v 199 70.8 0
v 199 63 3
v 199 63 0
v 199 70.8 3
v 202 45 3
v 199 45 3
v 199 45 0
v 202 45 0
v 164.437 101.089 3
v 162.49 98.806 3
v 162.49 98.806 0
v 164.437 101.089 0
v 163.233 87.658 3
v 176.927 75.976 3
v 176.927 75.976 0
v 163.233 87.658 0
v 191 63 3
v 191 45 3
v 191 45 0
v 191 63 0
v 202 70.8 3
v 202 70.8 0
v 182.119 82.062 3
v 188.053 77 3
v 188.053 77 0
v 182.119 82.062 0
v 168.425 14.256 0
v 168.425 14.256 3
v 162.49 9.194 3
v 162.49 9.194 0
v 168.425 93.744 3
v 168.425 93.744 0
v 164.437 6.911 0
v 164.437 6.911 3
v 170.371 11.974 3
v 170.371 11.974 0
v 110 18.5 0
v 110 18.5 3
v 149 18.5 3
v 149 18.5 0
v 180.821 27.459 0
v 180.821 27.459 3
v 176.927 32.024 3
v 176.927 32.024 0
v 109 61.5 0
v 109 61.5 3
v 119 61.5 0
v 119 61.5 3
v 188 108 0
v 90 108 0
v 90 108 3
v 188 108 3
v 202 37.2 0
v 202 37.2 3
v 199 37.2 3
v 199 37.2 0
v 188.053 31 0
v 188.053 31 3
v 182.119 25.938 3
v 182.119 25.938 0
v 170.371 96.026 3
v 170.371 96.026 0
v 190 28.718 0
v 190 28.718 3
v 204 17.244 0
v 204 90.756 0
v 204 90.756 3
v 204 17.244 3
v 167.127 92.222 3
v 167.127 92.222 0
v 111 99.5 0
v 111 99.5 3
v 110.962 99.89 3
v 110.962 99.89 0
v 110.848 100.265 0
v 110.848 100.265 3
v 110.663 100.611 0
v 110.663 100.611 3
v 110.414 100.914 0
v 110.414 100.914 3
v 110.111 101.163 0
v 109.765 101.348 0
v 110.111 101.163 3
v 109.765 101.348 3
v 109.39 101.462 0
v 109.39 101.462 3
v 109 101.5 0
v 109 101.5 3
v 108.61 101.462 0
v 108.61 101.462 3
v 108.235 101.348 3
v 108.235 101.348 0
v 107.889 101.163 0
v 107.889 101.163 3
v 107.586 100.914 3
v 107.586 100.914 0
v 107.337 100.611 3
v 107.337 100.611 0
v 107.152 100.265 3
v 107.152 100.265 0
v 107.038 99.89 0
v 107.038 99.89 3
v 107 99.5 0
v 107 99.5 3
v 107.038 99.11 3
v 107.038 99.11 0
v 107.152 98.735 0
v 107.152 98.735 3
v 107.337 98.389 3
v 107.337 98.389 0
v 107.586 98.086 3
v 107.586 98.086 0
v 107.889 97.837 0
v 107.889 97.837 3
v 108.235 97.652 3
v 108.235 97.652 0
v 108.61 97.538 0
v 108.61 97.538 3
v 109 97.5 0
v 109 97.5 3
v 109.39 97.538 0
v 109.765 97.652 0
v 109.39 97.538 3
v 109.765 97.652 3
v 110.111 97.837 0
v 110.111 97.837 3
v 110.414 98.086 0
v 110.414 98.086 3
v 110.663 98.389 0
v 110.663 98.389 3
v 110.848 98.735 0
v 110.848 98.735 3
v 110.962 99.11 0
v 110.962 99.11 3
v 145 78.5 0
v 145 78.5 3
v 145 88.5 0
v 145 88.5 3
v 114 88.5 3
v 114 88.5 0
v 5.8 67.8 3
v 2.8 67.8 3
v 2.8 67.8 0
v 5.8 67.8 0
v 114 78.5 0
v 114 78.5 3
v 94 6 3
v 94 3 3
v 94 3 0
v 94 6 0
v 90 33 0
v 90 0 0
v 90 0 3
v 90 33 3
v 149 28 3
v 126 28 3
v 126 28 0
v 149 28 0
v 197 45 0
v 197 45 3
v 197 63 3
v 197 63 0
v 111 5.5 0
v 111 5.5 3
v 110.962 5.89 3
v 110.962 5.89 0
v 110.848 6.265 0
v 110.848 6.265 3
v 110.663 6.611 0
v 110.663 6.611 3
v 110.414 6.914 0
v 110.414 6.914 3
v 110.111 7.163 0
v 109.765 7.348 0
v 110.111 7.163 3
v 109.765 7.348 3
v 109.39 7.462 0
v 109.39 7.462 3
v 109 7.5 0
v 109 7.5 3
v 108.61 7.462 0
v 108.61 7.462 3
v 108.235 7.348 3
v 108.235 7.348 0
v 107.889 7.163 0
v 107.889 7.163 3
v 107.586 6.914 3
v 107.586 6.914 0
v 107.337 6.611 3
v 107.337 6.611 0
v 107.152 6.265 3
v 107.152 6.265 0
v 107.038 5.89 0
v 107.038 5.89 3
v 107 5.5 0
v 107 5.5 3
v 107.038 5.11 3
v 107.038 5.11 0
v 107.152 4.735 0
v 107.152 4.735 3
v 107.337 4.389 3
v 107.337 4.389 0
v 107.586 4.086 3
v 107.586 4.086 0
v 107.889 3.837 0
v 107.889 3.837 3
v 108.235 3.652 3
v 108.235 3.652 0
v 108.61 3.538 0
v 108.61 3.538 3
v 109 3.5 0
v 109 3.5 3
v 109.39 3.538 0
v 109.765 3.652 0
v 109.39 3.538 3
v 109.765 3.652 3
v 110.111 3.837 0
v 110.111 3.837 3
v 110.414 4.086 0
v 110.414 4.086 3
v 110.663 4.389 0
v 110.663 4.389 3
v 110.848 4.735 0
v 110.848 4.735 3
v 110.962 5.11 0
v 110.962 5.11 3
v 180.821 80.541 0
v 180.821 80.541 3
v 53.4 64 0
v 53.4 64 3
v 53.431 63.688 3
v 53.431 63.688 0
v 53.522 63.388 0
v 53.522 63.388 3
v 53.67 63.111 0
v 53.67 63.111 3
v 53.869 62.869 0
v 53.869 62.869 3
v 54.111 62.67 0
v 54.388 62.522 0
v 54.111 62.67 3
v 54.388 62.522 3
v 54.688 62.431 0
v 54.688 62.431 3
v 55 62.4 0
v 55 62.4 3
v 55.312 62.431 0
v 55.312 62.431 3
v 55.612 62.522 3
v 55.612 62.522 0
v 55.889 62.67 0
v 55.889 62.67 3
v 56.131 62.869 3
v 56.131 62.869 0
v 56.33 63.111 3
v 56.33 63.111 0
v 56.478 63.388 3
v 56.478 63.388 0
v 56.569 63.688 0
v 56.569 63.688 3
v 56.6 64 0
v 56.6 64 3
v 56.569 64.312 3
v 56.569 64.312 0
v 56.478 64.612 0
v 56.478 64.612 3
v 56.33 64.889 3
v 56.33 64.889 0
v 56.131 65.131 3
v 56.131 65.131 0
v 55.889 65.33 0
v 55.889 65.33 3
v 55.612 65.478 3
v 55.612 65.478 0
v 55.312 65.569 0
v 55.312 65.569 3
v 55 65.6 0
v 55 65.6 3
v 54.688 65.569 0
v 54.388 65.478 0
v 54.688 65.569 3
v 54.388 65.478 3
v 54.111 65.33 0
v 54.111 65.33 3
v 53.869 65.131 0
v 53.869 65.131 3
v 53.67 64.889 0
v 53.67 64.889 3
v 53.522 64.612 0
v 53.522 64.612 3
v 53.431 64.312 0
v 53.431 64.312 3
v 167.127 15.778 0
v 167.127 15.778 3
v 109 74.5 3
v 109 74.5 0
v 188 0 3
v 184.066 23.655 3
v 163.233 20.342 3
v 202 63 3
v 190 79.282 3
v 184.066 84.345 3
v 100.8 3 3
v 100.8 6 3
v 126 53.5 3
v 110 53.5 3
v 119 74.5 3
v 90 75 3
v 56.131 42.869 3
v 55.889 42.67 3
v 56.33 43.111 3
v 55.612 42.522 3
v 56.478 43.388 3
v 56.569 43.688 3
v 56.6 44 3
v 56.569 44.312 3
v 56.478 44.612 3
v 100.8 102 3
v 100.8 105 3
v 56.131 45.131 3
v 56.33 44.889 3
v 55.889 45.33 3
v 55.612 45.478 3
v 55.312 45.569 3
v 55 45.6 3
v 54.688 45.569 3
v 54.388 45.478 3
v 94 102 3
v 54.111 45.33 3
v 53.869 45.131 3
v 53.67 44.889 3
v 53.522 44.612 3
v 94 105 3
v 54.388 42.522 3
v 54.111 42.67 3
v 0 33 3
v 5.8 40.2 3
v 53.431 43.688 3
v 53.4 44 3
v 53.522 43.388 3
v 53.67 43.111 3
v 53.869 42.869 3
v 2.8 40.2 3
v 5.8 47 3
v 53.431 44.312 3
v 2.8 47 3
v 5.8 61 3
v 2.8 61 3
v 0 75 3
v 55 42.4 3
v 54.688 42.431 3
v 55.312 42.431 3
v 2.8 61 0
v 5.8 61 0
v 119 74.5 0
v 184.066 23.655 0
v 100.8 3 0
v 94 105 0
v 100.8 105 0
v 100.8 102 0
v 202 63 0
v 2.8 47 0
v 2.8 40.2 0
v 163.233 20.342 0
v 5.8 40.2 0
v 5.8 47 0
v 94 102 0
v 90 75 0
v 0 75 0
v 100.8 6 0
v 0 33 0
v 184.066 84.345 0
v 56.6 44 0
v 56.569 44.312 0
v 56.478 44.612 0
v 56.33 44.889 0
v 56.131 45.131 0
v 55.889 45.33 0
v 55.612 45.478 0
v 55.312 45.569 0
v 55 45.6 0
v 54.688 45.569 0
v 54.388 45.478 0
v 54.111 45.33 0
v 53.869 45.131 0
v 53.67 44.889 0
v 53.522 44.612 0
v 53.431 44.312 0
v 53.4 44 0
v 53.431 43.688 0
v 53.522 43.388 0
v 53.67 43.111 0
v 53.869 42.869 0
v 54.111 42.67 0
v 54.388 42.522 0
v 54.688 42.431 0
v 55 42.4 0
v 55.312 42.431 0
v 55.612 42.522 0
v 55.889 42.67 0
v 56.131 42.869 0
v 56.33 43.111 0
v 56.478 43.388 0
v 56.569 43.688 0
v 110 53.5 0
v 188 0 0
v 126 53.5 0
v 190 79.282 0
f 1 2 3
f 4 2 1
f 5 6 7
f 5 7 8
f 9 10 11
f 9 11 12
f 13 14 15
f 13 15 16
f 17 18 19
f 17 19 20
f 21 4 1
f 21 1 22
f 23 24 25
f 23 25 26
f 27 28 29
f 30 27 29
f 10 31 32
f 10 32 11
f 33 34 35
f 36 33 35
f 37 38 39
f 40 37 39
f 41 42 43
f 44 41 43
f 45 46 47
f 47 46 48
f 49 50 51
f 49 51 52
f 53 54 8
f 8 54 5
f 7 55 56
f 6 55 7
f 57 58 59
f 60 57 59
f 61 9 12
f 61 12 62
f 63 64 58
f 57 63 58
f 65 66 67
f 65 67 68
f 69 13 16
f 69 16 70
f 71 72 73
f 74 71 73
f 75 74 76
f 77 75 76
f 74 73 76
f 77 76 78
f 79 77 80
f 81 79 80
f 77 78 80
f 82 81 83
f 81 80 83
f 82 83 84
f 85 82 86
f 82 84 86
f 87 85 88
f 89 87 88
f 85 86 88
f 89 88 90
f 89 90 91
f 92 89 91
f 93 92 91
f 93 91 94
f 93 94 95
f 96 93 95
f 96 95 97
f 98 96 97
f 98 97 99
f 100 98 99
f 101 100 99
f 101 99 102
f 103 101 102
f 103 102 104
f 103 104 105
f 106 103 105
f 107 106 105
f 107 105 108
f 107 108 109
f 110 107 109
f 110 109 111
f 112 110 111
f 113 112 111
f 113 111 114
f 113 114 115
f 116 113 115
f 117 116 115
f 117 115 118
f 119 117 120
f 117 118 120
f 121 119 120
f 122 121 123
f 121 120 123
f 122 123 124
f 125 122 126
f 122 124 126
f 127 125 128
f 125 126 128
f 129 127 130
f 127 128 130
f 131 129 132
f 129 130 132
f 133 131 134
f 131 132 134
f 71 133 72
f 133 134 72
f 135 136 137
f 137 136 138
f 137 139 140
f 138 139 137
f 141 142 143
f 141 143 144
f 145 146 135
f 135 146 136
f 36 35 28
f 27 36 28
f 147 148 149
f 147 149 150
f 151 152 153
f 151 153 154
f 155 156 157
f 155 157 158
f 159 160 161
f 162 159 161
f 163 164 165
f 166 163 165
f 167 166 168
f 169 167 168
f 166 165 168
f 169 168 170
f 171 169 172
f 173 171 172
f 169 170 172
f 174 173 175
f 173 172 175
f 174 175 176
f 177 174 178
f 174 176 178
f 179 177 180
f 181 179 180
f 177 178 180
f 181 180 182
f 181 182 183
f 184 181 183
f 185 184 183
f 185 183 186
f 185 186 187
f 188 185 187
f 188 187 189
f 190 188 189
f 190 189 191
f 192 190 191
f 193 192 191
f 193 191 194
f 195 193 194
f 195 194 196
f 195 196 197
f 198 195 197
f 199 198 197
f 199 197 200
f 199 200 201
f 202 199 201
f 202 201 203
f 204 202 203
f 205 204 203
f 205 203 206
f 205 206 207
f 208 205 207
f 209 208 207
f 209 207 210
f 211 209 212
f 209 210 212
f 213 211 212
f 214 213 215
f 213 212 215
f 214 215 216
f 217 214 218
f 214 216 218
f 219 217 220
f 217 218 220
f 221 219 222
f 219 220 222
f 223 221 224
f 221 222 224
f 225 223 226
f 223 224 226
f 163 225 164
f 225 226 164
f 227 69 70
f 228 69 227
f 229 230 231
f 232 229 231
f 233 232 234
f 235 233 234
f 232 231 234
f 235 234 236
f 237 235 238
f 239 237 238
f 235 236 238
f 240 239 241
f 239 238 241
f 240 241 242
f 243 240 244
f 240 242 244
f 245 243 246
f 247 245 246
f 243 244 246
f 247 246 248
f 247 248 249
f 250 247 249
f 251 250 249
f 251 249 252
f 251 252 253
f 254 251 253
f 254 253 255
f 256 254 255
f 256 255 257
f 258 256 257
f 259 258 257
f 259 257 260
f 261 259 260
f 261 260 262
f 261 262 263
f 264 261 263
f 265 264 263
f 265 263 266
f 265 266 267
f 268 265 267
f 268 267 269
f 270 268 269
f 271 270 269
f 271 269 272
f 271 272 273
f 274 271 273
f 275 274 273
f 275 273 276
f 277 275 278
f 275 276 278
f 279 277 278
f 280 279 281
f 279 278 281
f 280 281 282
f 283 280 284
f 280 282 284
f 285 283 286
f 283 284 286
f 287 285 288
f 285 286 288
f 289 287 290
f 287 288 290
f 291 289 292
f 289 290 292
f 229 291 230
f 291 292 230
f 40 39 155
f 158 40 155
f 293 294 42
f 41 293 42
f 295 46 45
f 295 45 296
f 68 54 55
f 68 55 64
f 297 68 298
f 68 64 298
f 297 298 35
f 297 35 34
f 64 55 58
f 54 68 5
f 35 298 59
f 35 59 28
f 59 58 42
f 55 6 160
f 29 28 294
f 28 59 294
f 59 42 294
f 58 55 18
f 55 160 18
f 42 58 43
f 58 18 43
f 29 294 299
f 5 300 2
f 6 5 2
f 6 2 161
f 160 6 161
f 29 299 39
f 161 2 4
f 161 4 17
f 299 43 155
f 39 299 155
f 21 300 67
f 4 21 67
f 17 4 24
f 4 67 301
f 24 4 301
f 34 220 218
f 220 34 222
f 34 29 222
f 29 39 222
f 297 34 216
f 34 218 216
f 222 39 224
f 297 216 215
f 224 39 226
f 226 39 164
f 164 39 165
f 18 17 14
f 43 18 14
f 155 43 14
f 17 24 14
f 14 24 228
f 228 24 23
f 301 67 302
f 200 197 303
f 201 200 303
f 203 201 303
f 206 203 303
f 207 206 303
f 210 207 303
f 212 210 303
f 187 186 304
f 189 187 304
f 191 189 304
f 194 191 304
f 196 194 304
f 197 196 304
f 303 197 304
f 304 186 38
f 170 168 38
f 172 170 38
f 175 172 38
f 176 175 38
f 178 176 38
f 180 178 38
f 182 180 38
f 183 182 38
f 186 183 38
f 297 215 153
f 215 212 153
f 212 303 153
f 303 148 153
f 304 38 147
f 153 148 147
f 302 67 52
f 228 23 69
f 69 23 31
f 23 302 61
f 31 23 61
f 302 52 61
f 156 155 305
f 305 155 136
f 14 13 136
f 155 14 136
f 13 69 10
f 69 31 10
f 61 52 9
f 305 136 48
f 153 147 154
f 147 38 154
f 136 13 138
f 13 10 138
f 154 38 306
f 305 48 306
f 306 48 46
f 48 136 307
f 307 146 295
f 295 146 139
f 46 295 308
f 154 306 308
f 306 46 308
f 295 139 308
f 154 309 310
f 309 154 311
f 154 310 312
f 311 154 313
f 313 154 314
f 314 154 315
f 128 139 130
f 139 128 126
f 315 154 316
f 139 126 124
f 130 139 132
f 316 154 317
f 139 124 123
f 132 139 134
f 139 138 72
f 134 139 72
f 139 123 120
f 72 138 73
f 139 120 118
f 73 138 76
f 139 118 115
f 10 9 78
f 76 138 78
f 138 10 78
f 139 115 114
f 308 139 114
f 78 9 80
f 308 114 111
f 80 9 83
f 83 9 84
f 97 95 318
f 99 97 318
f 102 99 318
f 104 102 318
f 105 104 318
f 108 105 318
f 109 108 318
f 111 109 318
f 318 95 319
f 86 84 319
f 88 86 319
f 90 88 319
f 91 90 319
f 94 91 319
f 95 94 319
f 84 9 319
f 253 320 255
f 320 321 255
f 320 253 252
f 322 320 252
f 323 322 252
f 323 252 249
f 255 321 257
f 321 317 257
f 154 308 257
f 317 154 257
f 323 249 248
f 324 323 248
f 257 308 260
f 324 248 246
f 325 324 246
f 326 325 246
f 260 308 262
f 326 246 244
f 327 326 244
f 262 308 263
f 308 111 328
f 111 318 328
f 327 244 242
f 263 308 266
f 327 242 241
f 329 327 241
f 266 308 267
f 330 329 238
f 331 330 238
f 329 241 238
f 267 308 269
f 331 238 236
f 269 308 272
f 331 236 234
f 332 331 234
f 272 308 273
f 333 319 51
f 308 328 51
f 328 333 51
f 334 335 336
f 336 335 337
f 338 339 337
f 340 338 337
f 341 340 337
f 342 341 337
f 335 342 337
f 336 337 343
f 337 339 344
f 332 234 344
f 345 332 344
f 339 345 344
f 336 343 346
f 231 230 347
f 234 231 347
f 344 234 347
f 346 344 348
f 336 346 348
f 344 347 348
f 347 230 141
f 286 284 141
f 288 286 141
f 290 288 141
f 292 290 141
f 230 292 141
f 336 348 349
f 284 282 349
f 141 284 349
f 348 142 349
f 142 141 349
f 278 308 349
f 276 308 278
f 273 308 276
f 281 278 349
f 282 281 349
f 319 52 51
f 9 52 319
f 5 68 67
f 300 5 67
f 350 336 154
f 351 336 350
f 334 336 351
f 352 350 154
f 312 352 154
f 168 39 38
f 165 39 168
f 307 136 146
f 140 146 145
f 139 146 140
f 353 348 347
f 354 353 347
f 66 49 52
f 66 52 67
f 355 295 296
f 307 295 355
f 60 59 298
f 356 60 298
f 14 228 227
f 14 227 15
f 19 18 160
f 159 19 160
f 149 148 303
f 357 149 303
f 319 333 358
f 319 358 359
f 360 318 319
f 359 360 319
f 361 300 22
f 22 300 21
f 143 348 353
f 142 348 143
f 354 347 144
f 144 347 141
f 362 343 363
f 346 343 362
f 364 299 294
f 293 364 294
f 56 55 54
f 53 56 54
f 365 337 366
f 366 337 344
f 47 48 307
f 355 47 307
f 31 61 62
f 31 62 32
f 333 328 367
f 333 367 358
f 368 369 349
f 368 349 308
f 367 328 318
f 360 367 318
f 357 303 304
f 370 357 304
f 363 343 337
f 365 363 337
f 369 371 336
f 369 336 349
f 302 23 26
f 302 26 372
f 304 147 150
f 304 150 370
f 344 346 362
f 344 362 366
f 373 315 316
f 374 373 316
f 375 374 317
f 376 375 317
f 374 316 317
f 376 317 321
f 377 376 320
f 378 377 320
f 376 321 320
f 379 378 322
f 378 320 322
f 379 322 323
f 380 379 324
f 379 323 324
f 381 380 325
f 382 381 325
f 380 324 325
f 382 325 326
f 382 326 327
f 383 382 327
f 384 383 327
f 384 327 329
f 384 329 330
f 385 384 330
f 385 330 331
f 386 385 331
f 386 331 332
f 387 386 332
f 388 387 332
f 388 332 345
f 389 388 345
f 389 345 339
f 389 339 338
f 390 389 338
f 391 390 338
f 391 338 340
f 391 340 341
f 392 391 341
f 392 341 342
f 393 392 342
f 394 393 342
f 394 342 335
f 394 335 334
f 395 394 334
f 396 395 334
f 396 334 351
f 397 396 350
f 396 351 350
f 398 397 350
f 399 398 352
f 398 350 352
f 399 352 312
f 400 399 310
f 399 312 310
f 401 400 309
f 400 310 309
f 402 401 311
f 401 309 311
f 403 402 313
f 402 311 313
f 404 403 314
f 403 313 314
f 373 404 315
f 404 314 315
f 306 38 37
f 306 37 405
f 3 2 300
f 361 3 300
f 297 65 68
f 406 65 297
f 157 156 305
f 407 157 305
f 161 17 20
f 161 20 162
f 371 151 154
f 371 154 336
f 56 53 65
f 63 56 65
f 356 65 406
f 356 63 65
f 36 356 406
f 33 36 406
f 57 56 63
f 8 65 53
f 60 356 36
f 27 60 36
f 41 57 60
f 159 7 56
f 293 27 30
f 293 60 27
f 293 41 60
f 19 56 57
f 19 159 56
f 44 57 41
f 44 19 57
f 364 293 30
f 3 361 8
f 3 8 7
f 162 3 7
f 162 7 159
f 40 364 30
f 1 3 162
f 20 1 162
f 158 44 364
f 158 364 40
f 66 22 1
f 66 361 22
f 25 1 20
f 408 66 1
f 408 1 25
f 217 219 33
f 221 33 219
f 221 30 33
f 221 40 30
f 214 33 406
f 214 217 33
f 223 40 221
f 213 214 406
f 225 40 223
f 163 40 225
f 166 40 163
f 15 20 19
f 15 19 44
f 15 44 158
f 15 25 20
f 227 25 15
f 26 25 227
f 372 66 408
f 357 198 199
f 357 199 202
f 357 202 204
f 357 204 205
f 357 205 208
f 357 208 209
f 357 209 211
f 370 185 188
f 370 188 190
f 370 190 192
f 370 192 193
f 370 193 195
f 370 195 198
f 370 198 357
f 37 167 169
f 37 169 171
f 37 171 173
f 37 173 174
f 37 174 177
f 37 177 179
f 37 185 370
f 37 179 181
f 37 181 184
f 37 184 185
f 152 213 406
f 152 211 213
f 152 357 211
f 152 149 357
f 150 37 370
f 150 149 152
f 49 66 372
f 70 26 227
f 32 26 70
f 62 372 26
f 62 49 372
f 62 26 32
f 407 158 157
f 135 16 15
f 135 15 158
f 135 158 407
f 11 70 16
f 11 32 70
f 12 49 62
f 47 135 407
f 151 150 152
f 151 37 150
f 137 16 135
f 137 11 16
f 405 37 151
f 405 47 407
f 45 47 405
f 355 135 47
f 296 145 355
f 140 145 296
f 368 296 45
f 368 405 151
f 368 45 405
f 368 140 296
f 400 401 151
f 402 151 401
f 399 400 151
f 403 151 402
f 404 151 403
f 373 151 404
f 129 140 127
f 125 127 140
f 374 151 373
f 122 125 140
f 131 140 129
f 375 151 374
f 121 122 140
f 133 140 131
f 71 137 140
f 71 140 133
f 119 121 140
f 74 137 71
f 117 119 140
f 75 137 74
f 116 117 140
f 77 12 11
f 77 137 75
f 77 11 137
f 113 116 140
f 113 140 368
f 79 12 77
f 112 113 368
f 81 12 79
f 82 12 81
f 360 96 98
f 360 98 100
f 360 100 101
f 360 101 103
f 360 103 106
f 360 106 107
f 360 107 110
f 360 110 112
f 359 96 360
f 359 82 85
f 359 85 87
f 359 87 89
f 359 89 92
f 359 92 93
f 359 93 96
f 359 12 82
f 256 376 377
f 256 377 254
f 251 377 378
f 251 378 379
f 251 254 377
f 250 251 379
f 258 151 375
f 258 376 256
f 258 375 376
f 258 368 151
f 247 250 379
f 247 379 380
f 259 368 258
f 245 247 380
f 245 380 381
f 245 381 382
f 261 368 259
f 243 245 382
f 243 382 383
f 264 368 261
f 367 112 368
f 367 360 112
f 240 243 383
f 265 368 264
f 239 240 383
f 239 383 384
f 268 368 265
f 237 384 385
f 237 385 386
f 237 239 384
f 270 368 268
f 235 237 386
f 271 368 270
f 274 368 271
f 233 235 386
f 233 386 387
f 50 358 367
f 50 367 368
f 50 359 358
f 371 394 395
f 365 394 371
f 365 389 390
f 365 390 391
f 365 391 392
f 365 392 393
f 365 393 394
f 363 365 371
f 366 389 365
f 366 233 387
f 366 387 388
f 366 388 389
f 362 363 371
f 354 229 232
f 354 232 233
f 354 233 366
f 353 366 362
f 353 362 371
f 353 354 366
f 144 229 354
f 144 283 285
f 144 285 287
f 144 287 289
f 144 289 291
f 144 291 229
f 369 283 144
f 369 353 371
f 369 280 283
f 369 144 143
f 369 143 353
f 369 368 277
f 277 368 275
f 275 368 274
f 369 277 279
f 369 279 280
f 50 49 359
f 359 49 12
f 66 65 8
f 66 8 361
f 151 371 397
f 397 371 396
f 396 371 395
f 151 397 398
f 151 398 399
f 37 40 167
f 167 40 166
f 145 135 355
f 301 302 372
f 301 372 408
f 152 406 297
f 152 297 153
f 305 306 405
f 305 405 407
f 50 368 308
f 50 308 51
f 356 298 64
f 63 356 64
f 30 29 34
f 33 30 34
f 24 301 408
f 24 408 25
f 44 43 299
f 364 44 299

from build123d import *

# Parameters (mm, degrees)
RESSALTO_EXTRUS_O1_DEPTH = 3
ESBO_O2_W                = 31
ESBO_O2_H                = 10
ESBO_O2_W_2              = 16
ESBO_O2_H_2              = 35
ESBO_O2_W_3              = 10
ESBO_O2_H_3              = 13
ESBO_O2_W_4              = 23
ESBO_O2_H_4              = 9.5
ESBO_O2_R                = 2
CORTE_EXTRUS_O1_DEPTH    = 231.844103239
ESBO_O3_W                = 3
ESBO_O3_H                = 7.8
ESBO_O3_W_2              = 6
ESBO_O3_H_2              = 18
ESBO_O3_H_3              = 6.8
CORTE_EXTRUS_O2_DEPTH    = 10
ESBO_O4_W                = 6.8
ESBO_O4_H                = 3
CORTE_EXTRUS_O3_DEPTH    = 10
ESBO_O6_R                = 1.6
CORTE_EXTRUS_O5_DEPTH    = 10


with BuildPart() as part:
    # Esboço1 → Ressalto-extrusão1 (new body)
    with BuildSketch(Plane.XY):
        Polygon((0, 33), (0, 75), (90, 75), (90, 108), (188, 108), (204, 90.756494192), (204, 17.243505808), (188, 0), (90, 0), (90, 33), align=None)
    extrude(amount=RESSALTO_EXTRUS_O1_DEPTH)

    # Esboço2 → Corte-extrusão1 (cut, through all)
    with BuildSketch(Plane.XY.offset(3)):
        with Locations((129.5, 83.5)):
            Rectangle(ESBO_O2_W, ESBO_O2_H)
        with Locations((118, 36)):
            Rectangle(ESBO_O2_W_2, ESBO_O2_H_2)
        with Locations((114, 68)):
            Rectangle(ESBO_O2_W_3, ESBO_O2_H_3)
        with Locations((137.5, 23.25)):
            Rectangle(ESBO_O2_W_4, ESBO_O2_H_4)
        with Locations((109, 5.5)):
            Circle(ESBO_O2_R)
        with Locations((109, 99.5)):
            Circle(ESBO_O2_R)
    extrude(amount=-CORTE_EXTRUS_O1_DEPTH, mode=Mode.SUBTRACT)

    # Esboço3 → Corte-extrusão2 (cut)
    with BuildSketch(Plane.XY.offset(3)):
        Polygon((164.43729409, 6.911468095), (170.371493676, 11.973609467), (168.424516225, 14.255993924), (162.490316639, 9.193852552), align=None)
        with Locations((200.5, 41.1)):
            Rectangle(ESBO_O3_W, ESBO_O3_H)
        Polygon((190, 28.717615544), (188.053022549, 31), (182.118822963, 25.937858628), (184.065800414, 23.655474172), align=None)
        Polygon((184.065800414, 84.344525828), (190, 79.282384456), (188.053022549, 77), (182.118822963, 82.062141372), align=None)
        Polygon((162.490316639, 98.806147448), (164.43729409, 101.088531905), (170.371493676, 96.026390533), (168.424516225, 93.744006076), align=None)
        Polygon((167.126531258, 15.777583561), (180.820837996, 27.459448266), (176.926883094, 32.024217178), (163.232576357, 20.342352474), align=None)
        with Locations((200.5, 66.9)):
            Rectangle(ESBO_O3_W, ESBO_O3_H)
        with Locations((194, 54)):
            Rectangle(ESBO_O3_W_2, ESBO_O3_H_2)
        Polygon((176.926883094, 75.975782822), (163.232576357, 87.657647526), (167.126531258, 92.222416439), (180.820837996, 80.540551734), align=None)
        with Locations((4.3, 43.6)):
            Rectangle(ESBO_O3_W, ESBO_O3_H_3)
        with Locations((4.3, 64.4)):
            Rectangle(ESBO_O3_W, ESBO_O3_H_3)
    extrude(amount=-CORTE_EXTRUS_O2_DEPTH, mode=Mode.SUBTRACT)

    # Esboço4 → Corte-extrusão3 (cut)
    with BuildSketch(Plane.XY.offset(3)):
        with Locations((97.4, 103.5)):
            Rectangle(ESBO_O4_W, ESBO_O4_H)
        with Locations((97.4, 4.5)):
            Rectangle(ESBO_O4_W, ESBO_O4_H)
    extrude(amount=-CORTE_EXTRUS_O3_DEPTH, mode=Mode.SUBTRACT)

    # Esboço6 → Corte-extrusão5 (cut)
    with BuildSketch(Plane.XY.offset(3)):
        with Locations((55, 44)):
            Circle(ESBO_O6_R)
        with Locations(Location((55, 64, 0), (0, 0, 180))):
            Circle(ESBO_O6_R)
    extrude(amount=-CORTE_EXTRUS_O5_DEPTH, mode=Mode.SUBTRACT)


solid = part.part
